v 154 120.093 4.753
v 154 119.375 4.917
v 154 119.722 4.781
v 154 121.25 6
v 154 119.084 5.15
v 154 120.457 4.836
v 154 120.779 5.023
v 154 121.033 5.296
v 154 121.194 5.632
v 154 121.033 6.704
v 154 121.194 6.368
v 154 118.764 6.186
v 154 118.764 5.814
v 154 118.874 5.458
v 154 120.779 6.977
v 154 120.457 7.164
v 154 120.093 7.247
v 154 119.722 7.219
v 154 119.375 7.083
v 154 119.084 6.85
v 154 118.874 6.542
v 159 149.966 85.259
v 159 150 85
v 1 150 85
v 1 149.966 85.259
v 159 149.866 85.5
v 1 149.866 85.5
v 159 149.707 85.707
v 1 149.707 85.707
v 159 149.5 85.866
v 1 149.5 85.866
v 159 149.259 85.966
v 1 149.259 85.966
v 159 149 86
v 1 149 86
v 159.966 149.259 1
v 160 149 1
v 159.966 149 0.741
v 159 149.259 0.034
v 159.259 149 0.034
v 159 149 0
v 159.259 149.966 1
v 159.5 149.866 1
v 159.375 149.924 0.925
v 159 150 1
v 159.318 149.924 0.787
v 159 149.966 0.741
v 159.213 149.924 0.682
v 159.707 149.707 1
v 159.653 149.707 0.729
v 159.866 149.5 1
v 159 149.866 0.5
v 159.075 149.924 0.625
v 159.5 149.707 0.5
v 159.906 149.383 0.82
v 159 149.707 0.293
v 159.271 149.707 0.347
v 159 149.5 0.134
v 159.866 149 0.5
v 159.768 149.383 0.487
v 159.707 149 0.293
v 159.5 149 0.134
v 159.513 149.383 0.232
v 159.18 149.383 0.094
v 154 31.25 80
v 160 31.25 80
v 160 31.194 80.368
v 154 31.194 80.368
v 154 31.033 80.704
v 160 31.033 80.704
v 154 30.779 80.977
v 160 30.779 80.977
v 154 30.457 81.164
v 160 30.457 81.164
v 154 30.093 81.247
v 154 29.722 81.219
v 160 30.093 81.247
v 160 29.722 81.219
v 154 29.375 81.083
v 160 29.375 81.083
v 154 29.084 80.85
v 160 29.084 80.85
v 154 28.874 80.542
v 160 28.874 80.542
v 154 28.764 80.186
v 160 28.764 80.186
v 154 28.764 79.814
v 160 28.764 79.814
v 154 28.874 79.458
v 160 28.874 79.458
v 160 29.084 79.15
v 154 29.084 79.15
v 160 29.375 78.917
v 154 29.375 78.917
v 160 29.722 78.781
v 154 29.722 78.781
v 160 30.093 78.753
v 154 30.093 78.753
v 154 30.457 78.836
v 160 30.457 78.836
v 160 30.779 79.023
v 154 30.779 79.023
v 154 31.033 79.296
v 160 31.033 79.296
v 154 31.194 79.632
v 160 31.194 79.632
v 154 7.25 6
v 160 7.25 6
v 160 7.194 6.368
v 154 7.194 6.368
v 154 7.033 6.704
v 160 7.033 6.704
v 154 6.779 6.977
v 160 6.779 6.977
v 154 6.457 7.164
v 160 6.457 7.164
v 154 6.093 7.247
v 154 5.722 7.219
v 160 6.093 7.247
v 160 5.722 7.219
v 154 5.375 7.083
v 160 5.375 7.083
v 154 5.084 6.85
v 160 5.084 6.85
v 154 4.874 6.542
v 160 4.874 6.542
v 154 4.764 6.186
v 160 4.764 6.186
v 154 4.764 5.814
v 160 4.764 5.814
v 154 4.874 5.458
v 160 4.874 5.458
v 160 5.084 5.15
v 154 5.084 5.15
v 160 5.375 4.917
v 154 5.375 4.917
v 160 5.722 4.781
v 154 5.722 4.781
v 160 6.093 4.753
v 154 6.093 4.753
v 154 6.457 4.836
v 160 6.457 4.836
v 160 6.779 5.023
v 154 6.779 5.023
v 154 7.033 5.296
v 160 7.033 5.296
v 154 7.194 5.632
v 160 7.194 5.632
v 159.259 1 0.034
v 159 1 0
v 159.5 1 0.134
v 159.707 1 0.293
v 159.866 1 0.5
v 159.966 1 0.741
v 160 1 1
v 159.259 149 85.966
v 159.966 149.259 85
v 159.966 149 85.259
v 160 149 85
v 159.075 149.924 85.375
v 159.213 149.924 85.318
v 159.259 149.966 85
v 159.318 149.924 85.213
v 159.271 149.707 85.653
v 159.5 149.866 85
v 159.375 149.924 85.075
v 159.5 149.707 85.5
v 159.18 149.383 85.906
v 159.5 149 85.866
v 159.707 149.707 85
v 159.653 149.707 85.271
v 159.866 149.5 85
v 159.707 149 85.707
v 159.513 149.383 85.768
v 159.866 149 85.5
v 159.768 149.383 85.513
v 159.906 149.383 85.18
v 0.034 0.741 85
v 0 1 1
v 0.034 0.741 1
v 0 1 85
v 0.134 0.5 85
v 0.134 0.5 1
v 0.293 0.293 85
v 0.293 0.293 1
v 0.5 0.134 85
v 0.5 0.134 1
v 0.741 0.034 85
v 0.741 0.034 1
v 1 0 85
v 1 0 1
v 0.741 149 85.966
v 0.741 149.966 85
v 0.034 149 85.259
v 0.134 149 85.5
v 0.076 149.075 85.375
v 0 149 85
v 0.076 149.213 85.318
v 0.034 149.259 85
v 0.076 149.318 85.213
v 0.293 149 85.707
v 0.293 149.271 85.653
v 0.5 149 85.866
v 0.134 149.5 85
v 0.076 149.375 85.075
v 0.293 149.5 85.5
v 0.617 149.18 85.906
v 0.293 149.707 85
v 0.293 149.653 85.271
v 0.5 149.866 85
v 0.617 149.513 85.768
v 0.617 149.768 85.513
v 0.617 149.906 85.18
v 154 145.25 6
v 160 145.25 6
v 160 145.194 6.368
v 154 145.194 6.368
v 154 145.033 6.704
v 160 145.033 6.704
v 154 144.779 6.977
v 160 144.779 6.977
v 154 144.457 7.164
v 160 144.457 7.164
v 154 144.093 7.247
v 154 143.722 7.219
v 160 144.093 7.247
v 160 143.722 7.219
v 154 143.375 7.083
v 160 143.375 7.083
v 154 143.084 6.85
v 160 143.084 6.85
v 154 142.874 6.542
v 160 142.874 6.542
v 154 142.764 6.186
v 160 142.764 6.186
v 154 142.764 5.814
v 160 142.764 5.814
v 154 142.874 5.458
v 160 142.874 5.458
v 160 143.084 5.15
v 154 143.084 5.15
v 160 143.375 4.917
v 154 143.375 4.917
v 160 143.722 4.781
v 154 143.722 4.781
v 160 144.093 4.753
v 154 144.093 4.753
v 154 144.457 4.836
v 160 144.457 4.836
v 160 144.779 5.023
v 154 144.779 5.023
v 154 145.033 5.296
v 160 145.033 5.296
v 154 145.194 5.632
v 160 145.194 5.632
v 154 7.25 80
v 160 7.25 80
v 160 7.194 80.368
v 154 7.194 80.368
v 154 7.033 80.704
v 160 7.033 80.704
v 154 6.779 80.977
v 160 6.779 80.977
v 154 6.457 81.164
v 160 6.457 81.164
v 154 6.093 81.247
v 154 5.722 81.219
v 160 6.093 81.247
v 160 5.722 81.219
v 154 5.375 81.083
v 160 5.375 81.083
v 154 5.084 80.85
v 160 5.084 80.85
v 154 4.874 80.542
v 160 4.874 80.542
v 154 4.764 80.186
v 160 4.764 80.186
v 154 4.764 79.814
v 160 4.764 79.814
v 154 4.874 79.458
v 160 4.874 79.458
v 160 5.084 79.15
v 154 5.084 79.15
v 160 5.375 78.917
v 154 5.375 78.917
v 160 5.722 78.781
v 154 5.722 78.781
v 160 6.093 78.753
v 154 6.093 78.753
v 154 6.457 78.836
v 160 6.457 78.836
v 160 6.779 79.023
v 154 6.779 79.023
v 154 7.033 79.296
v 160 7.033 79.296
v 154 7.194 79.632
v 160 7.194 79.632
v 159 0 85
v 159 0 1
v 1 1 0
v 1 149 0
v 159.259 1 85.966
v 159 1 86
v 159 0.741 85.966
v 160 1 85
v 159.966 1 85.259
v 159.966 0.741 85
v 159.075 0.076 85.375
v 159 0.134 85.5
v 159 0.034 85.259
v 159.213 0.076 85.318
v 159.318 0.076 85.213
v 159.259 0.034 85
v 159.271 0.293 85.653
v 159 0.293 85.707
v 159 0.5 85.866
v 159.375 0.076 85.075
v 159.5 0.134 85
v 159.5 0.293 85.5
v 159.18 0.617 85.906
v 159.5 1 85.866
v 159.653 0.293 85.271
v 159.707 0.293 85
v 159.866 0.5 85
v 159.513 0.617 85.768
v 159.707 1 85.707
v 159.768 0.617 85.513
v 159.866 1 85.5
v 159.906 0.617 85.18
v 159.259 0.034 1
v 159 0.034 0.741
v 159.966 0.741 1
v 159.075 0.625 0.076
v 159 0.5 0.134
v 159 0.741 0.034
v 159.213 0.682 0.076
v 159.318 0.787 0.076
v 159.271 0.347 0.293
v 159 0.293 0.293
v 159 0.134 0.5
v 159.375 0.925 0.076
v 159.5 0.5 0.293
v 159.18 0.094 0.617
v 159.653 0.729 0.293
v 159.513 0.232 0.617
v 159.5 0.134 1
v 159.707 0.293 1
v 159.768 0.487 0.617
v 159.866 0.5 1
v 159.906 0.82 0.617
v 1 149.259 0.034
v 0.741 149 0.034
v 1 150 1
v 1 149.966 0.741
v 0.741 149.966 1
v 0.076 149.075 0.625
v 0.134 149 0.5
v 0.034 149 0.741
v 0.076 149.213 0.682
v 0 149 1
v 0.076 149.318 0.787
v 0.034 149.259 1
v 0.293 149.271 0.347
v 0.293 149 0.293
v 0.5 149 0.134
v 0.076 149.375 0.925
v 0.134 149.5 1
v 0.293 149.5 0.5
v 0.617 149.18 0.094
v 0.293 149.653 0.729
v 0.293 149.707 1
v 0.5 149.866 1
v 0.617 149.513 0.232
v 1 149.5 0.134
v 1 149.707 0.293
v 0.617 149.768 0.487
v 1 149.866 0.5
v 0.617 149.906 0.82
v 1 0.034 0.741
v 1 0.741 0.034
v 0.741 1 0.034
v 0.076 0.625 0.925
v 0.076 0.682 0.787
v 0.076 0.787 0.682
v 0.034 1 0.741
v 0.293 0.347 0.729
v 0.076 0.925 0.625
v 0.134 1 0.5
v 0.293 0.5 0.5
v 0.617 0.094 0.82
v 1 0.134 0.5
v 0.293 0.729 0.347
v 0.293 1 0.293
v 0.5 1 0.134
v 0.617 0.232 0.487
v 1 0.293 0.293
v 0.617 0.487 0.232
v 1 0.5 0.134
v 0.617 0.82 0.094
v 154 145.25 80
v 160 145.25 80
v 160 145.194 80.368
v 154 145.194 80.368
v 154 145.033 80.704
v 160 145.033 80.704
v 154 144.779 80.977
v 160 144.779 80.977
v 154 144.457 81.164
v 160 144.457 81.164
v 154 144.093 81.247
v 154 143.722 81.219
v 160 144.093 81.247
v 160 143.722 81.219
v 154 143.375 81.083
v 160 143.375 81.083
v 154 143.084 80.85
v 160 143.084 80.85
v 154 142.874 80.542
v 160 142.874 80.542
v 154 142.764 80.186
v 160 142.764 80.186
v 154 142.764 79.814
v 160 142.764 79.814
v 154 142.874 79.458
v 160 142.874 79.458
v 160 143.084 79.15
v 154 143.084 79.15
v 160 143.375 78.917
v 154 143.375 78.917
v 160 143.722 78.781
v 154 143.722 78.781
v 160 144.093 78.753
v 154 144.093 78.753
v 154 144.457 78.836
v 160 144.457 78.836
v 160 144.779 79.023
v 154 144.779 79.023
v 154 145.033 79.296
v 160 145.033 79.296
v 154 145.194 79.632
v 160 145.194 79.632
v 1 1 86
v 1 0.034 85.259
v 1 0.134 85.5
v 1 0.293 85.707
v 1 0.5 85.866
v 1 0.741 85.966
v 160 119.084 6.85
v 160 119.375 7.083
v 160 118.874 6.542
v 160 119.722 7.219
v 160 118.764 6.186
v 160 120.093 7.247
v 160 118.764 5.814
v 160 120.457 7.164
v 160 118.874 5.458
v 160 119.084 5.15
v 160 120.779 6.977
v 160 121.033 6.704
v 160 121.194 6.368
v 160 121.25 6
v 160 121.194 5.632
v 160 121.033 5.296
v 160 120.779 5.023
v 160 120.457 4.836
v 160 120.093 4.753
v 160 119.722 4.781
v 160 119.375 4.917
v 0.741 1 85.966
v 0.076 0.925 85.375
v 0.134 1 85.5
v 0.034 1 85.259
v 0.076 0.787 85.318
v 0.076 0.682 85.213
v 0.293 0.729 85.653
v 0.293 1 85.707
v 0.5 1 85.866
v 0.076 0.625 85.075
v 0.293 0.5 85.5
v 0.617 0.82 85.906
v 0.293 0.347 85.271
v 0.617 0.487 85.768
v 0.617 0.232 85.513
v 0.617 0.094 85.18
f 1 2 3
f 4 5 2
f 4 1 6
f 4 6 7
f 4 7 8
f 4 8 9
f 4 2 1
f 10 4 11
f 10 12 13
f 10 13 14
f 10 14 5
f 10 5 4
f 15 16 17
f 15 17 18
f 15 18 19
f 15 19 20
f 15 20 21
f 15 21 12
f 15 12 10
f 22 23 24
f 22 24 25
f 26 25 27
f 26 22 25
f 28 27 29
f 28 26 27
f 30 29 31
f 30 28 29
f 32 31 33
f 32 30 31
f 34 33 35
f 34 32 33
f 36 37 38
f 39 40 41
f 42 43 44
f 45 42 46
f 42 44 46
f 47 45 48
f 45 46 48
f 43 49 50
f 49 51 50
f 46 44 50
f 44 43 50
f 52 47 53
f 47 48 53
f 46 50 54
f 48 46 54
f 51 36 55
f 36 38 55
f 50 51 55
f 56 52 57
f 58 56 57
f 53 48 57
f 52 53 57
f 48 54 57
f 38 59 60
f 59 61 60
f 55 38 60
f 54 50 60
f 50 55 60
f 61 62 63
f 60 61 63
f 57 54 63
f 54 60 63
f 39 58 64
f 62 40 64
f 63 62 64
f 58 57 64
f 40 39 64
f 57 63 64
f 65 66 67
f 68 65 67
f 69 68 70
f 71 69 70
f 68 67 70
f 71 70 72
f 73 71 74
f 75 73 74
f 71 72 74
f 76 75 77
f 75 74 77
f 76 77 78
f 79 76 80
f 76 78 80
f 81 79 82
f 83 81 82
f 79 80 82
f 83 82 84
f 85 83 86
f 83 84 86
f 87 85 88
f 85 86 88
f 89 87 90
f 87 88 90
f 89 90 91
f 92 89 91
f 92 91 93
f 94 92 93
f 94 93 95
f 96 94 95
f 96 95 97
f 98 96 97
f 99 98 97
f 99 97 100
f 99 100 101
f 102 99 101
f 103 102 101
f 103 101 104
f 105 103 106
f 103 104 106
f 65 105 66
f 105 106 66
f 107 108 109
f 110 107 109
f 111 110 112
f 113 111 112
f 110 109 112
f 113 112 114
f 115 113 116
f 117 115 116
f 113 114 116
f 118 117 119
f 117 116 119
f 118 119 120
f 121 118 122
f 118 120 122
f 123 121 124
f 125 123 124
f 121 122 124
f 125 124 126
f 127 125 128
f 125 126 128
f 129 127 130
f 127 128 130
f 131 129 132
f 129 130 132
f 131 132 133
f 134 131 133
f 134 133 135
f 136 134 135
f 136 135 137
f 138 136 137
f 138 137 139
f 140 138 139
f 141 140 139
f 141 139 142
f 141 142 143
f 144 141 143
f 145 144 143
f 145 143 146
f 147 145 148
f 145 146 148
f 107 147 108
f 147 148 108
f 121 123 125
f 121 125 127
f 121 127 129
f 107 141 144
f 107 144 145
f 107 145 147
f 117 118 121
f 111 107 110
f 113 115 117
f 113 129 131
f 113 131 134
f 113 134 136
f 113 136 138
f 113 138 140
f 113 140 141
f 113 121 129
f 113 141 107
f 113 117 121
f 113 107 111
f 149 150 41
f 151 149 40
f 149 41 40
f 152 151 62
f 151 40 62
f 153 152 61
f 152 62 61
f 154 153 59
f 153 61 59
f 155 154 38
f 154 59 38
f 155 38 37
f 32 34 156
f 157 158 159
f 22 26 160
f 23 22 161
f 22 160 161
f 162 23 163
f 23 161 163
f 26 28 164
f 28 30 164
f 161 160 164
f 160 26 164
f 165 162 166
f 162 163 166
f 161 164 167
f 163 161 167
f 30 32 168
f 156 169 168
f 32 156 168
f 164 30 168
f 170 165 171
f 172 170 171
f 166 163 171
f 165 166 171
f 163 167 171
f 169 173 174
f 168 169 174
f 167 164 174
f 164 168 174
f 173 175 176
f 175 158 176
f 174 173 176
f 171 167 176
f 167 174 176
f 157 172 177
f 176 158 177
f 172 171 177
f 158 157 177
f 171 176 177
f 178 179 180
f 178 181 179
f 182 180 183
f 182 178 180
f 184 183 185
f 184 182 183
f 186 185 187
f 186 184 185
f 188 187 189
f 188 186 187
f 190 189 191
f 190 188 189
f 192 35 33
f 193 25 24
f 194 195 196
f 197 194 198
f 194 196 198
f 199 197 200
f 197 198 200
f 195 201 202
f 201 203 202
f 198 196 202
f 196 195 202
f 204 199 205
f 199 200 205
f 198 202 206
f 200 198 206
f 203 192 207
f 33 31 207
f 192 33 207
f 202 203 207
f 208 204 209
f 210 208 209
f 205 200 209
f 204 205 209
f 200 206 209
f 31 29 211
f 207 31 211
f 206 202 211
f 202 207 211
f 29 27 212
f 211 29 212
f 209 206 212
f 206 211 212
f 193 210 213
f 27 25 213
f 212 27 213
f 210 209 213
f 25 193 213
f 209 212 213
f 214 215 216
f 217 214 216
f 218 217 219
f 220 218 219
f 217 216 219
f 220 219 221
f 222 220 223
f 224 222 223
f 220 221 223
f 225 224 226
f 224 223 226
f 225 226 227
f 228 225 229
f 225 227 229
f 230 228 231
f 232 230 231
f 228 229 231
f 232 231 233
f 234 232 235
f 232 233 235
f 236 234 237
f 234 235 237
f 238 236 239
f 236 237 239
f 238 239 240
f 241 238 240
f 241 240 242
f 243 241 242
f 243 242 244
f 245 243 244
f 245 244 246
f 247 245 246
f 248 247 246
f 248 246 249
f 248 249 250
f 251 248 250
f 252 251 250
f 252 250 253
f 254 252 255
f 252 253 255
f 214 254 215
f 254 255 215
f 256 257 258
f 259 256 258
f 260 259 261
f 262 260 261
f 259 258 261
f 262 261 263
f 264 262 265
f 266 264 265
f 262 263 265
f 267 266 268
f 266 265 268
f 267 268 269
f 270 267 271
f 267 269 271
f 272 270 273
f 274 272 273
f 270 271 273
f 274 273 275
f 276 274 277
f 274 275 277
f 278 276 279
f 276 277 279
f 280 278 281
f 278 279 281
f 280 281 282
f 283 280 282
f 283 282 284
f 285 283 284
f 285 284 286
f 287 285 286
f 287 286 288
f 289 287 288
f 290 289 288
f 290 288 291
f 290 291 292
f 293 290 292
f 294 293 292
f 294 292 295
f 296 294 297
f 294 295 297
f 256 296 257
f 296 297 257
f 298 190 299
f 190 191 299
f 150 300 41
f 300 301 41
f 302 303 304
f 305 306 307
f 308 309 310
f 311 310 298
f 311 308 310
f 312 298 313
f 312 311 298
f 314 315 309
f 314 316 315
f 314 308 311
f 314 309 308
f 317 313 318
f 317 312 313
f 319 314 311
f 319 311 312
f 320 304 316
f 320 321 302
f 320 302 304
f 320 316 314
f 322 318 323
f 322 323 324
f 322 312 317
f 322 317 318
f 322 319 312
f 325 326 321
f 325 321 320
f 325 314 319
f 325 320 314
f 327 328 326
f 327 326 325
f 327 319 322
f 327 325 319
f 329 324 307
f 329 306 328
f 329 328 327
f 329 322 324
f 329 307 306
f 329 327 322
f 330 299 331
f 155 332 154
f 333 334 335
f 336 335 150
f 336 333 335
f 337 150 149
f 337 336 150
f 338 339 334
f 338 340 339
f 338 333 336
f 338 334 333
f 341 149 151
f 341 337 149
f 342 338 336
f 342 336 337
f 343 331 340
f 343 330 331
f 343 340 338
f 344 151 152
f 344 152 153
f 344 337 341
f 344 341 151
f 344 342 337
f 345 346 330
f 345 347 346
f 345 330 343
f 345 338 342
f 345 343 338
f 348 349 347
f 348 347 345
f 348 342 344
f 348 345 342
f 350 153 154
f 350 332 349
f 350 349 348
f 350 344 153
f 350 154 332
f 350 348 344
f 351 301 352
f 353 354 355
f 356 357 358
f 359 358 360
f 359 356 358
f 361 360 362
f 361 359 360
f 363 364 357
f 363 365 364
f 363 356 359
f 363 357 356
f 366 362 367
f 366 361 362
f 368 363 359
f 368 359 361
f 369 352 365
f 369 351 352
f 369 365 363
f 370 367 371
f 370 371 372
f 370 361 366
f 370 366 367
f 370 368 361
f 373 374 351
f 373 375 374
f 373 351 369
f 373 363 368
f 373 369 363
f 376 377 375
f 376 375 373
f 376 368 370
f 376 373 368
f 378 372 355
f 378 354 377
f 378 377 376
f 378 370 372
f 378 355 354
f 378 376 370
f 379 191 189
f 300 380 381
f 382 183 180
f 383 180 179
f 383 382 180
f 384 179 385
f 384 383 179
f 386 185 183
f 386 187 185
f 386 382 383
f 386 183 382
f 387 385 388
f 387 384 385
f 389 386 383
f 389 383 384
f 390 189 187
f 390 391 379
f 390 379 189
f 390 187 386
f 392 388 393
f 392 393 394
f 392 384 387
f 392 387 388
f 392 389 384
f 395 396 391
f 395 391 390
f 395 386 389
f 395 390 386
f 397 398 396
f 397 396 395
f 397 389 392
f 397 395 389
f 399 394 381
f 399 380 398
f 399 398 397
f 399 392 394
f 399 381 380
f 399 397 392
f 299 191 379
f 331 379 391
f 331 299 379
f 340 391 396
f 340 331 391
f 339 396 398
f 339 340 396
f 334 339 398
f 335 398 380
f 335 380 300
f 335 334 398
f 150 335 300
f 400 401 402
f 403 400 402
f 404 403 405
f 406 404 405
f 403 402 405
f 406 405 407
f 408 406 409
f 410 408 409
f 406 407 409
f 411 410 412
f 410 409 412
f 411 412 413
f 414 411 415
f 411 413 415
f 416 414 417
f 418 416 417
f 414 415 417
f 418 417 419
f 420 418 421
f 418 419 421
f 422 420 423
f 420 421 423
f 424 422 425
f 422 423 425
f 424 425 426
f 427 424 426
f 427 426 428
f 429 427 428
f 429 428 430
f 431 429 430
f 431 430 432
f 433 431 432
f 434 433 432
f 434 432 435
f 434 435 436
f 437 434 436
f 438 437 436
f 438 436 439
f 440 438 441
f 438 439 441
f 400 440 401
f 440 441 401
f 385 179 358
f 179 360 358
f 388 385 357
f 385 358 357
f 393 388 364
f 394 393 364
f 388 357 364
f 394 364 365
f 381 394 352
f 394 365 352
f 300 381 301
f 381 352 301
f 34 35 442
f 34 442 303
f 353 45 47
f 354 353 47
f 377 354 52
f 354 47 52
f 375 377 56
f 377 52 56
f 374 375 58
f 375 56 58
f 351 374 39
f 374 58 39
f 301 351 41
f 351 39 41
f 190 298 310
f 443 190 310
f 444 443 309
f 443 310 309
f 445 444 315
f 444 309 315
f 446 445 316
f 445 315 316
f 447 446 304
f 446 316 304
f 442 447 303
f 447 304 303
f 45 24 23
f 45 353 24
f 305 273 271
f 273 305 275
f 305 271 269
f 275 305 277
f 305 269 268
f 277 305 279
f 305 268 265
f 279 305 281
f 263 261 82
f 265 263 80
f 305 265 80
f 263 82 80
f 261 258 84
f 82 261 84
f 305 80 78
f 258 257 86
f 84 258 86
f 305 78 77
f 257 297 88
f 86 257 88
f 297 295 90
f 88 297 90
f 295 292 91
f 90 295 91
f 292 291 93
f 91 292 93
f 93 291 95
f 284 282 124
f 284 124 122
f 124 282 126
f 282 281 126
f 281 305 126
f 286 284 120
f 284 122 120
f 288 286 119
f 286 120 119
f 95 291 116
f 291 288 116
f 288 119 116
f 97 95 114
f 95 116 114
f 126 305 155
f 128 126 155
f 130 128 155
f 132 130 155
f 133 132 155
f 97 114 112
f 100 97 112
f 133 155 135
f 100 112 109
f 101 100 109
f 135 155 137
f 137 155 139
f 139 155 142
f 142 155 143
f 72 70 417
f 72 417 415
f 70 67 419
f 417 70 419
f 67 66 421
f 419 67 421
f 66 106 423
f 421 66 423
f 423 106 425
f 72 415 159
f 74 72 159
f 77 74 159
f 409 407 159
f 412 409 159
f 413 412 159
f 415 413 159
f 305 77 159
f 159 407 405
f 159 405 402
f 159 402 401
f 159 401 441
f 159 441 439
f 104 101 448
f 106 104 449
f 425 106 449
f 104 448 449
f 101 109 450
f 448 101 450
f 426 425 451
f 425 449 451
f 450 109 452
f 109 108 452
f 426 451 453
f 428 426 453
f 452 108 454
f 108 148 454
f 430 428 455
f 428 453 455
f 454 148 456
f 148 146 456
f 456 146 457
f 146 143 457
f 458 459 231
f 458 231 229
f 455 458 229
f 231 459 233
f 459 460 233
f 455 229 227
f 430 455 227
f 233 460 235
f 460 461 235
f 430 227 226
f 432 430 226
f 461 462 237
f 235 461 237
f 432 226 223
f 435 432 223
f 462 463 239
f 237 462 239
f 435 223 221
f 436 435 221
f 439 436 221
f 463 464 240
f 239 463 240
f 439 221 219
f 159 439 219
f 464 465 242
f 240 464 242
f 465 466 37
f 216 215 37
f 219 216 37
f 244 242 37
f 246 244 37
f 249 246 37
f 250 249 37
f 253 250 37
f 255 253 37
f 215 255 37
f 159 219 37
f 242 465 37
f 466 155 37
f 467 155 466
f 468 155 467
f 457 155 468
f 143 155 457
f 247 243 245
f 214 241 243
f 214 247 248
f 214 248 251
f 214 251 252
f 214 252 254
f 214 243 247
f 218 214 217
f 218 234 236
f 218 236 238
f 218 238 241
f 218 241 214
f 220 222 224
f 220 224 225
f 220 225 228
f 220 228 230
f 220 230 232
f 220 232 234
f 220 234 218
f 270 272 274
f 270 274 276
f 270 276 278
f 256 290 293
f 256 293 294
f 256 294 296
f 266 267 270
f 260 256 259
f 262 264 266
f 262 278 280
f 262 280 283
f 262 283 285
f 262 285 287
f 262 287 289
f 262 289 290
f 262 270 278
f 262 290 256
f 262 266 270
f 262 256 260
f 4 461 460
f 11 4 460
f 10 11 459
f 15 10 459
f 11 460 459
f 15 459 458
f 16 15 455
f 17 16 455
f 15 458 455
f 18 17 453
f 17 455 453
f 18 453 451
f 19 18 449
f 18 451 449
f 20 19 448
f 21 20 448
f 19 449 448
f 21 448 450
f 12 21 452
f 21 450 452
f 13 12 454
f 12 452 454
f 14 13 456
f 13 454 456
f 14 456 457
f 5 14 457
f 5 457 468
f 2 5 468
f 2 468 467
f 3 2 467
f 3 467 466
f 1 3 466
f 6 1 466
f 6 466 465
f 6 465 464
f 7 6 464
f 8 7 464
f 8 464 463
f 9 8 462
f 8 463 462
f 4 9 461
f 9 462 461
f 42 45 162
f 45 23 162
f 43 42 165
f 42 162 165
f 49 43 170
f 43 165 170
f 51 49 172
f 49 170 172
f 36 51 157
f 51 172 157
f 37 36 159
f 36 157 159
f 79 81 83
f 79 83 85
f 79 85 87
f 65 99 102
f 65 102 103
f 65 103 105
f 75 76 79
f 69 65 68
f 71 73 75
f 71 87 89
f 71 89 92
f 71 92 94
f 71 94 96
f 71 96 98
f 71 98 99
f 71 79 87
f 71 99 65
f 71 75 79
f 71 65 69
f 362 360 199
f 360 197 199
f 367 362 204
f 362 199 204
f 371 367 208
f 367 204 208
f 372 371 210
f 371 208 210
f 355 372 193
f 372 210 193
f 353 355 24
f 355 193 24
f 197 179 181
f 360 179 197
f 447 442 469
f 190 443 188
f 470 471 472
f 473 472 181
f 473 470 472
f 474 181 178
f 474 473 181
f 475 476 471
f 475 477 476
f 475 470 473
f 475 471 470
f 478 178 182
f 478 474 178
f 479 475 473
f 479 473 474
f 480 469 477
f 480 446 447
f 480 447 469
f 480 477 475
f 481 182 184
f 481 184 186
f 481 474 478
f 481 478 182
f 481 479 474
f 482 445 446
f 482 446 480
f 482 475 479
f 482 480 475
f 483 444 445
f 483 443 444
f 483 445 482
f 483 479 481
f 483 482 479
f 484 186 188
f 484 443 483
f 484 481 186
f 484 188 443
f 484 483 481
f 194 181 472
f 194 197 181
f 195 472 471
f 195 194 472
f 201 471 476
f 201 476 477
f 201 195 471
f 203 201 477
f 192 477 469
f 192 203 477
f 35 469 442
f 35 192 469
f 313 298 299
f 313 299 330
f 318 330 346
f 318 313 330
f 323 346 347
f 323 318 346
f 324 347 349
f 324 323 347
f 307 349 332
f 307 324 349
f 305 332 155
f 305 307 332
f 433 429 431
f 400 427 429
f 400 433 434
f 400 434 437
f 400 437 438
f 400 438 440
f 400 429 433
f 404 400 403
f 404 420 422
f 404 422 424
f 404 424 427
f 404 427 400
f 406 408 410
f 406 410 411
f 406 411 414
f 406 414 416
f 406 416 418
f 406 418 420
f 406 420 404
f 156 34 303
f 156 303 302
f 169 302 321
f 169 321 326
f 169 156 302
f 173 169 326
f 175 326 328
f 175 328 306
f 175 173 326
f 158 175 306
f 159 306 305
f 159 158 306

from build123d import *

# Parameters (mm, degrees)
F0_W     = 160
F0_H     = 150
F1_DEPTH = 86
F2_R     = 1.25
F3_DEPTH = 6
F4_R     = 1


with BuildPart() as f1:
    # F0 (on Top) → F1 (new body)
    with BuildSketch(Plane.XY):
        with Locations((80, 75)):
            Rectangle(F0_W, F0_H)
    extrude(amount=F1_DEPTH)

    # F2 (on face) → F3 (cut)
    with BuildSketch(Plane.YZ.offset(160)):
        with Locations((6, 80)):
            Circle(F2_R)
        with Locations((30, 80)):
            Circle(F2_R)
        with Locations((144, 80)):
            Circle(F2_R)
        with Locations((144, 6)):
            Circle(F2_R)
        with Locations((6, 6)):
            Circle(F2_R)
        with Locations((120, 6)):
            Circle(F2_R)
    extrude(amount=-F3_DEPTH, mode=Mode.SUBTRACT)

    # F4
    f4_edges = [f1.edges().sort_by_distance(p)[0] for p in [
        (160, 75, 86),
        (80, 0, 86),
        (160, 0, 43),
        (80, 150, 86),
        (0, 75, 86),
        (80, 0, 0),
        (0, 0, 43),
        (160, 75, 0),
        (160, 150, 43),
        (80, 150, 0),
        (0, 75, 0),
        (0, 150, 43),
    ]]
    fillet(f4_edges, radius=F4_R)


solid = f1.part
